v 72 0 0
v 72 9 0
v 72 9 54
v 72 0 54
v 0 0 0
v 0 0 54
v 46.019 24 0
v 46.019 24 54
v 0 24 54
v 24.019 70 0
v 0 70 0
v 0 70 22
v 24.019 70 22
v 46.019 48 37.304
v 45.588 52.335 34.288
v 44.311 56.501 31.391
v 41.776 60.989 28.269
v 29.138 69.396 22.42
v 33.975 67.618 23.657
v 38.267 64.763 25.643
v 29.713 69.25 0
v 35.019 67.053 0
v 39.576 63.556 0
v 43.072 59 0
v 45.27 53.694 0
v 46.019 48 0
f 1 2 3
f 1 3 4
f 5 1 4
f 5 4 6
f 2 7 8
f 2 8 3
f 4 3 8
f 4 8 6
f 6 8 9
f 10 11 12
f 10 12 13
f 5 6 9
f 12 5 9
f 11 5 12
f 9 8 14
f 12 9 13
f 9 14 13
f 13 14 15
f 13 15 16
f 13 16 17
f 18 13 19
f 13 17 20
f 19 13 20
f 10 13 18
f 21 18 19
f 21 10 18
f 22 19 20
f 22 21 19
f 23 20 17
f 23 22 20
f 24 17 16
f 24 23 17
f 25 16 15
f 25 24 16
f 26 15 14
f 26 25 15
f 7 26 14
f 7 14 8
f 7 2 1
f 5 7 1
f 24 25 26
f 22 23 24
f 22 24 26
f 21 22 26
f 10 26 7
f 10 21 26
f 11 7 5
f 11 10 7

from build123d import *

# Parameters (mm, degrees)
EXTRUDE1_DEPTH = 54
EXTRUDE2_DEPTH = 47.019237886


with BuildPart() as part:
    # Sketch1 → Extrude1 (new body)
    with BuildSketch(Plane.XY):
        with BuildLine():
            Line((0, 0), (0, 70))
            Line((0, 70), (24.019237886, 70))
            ThreePointArc((24.019237886, 70), (39.575587073, 63.556349186), (46.019237886, 48))
            Line((46.019237886, 48), (46.019237886, 24))
            Line((46.019237886, 24), (72, 9))
            Line((72, 9), (72, 0))
            Line((72, 0), (0, 0))
        make_face()
    extrude(amount=EXTRUDE1_DEPTH)

    # Sketch2 → Extrude2 (cut, through all)
    with BuildSketch(Plane(origin=(46.019237886, 0, 0), x_dir=(0, 0, -1), z_dir=(1, 0, 0))):
        Polygon((-54, 24), (-22, 70), (-54, 70), align=None)
    extrude(amount=-EXTRUDE2_DEPTH, mode=Mode.SUBTRACT)


solid = part.part
